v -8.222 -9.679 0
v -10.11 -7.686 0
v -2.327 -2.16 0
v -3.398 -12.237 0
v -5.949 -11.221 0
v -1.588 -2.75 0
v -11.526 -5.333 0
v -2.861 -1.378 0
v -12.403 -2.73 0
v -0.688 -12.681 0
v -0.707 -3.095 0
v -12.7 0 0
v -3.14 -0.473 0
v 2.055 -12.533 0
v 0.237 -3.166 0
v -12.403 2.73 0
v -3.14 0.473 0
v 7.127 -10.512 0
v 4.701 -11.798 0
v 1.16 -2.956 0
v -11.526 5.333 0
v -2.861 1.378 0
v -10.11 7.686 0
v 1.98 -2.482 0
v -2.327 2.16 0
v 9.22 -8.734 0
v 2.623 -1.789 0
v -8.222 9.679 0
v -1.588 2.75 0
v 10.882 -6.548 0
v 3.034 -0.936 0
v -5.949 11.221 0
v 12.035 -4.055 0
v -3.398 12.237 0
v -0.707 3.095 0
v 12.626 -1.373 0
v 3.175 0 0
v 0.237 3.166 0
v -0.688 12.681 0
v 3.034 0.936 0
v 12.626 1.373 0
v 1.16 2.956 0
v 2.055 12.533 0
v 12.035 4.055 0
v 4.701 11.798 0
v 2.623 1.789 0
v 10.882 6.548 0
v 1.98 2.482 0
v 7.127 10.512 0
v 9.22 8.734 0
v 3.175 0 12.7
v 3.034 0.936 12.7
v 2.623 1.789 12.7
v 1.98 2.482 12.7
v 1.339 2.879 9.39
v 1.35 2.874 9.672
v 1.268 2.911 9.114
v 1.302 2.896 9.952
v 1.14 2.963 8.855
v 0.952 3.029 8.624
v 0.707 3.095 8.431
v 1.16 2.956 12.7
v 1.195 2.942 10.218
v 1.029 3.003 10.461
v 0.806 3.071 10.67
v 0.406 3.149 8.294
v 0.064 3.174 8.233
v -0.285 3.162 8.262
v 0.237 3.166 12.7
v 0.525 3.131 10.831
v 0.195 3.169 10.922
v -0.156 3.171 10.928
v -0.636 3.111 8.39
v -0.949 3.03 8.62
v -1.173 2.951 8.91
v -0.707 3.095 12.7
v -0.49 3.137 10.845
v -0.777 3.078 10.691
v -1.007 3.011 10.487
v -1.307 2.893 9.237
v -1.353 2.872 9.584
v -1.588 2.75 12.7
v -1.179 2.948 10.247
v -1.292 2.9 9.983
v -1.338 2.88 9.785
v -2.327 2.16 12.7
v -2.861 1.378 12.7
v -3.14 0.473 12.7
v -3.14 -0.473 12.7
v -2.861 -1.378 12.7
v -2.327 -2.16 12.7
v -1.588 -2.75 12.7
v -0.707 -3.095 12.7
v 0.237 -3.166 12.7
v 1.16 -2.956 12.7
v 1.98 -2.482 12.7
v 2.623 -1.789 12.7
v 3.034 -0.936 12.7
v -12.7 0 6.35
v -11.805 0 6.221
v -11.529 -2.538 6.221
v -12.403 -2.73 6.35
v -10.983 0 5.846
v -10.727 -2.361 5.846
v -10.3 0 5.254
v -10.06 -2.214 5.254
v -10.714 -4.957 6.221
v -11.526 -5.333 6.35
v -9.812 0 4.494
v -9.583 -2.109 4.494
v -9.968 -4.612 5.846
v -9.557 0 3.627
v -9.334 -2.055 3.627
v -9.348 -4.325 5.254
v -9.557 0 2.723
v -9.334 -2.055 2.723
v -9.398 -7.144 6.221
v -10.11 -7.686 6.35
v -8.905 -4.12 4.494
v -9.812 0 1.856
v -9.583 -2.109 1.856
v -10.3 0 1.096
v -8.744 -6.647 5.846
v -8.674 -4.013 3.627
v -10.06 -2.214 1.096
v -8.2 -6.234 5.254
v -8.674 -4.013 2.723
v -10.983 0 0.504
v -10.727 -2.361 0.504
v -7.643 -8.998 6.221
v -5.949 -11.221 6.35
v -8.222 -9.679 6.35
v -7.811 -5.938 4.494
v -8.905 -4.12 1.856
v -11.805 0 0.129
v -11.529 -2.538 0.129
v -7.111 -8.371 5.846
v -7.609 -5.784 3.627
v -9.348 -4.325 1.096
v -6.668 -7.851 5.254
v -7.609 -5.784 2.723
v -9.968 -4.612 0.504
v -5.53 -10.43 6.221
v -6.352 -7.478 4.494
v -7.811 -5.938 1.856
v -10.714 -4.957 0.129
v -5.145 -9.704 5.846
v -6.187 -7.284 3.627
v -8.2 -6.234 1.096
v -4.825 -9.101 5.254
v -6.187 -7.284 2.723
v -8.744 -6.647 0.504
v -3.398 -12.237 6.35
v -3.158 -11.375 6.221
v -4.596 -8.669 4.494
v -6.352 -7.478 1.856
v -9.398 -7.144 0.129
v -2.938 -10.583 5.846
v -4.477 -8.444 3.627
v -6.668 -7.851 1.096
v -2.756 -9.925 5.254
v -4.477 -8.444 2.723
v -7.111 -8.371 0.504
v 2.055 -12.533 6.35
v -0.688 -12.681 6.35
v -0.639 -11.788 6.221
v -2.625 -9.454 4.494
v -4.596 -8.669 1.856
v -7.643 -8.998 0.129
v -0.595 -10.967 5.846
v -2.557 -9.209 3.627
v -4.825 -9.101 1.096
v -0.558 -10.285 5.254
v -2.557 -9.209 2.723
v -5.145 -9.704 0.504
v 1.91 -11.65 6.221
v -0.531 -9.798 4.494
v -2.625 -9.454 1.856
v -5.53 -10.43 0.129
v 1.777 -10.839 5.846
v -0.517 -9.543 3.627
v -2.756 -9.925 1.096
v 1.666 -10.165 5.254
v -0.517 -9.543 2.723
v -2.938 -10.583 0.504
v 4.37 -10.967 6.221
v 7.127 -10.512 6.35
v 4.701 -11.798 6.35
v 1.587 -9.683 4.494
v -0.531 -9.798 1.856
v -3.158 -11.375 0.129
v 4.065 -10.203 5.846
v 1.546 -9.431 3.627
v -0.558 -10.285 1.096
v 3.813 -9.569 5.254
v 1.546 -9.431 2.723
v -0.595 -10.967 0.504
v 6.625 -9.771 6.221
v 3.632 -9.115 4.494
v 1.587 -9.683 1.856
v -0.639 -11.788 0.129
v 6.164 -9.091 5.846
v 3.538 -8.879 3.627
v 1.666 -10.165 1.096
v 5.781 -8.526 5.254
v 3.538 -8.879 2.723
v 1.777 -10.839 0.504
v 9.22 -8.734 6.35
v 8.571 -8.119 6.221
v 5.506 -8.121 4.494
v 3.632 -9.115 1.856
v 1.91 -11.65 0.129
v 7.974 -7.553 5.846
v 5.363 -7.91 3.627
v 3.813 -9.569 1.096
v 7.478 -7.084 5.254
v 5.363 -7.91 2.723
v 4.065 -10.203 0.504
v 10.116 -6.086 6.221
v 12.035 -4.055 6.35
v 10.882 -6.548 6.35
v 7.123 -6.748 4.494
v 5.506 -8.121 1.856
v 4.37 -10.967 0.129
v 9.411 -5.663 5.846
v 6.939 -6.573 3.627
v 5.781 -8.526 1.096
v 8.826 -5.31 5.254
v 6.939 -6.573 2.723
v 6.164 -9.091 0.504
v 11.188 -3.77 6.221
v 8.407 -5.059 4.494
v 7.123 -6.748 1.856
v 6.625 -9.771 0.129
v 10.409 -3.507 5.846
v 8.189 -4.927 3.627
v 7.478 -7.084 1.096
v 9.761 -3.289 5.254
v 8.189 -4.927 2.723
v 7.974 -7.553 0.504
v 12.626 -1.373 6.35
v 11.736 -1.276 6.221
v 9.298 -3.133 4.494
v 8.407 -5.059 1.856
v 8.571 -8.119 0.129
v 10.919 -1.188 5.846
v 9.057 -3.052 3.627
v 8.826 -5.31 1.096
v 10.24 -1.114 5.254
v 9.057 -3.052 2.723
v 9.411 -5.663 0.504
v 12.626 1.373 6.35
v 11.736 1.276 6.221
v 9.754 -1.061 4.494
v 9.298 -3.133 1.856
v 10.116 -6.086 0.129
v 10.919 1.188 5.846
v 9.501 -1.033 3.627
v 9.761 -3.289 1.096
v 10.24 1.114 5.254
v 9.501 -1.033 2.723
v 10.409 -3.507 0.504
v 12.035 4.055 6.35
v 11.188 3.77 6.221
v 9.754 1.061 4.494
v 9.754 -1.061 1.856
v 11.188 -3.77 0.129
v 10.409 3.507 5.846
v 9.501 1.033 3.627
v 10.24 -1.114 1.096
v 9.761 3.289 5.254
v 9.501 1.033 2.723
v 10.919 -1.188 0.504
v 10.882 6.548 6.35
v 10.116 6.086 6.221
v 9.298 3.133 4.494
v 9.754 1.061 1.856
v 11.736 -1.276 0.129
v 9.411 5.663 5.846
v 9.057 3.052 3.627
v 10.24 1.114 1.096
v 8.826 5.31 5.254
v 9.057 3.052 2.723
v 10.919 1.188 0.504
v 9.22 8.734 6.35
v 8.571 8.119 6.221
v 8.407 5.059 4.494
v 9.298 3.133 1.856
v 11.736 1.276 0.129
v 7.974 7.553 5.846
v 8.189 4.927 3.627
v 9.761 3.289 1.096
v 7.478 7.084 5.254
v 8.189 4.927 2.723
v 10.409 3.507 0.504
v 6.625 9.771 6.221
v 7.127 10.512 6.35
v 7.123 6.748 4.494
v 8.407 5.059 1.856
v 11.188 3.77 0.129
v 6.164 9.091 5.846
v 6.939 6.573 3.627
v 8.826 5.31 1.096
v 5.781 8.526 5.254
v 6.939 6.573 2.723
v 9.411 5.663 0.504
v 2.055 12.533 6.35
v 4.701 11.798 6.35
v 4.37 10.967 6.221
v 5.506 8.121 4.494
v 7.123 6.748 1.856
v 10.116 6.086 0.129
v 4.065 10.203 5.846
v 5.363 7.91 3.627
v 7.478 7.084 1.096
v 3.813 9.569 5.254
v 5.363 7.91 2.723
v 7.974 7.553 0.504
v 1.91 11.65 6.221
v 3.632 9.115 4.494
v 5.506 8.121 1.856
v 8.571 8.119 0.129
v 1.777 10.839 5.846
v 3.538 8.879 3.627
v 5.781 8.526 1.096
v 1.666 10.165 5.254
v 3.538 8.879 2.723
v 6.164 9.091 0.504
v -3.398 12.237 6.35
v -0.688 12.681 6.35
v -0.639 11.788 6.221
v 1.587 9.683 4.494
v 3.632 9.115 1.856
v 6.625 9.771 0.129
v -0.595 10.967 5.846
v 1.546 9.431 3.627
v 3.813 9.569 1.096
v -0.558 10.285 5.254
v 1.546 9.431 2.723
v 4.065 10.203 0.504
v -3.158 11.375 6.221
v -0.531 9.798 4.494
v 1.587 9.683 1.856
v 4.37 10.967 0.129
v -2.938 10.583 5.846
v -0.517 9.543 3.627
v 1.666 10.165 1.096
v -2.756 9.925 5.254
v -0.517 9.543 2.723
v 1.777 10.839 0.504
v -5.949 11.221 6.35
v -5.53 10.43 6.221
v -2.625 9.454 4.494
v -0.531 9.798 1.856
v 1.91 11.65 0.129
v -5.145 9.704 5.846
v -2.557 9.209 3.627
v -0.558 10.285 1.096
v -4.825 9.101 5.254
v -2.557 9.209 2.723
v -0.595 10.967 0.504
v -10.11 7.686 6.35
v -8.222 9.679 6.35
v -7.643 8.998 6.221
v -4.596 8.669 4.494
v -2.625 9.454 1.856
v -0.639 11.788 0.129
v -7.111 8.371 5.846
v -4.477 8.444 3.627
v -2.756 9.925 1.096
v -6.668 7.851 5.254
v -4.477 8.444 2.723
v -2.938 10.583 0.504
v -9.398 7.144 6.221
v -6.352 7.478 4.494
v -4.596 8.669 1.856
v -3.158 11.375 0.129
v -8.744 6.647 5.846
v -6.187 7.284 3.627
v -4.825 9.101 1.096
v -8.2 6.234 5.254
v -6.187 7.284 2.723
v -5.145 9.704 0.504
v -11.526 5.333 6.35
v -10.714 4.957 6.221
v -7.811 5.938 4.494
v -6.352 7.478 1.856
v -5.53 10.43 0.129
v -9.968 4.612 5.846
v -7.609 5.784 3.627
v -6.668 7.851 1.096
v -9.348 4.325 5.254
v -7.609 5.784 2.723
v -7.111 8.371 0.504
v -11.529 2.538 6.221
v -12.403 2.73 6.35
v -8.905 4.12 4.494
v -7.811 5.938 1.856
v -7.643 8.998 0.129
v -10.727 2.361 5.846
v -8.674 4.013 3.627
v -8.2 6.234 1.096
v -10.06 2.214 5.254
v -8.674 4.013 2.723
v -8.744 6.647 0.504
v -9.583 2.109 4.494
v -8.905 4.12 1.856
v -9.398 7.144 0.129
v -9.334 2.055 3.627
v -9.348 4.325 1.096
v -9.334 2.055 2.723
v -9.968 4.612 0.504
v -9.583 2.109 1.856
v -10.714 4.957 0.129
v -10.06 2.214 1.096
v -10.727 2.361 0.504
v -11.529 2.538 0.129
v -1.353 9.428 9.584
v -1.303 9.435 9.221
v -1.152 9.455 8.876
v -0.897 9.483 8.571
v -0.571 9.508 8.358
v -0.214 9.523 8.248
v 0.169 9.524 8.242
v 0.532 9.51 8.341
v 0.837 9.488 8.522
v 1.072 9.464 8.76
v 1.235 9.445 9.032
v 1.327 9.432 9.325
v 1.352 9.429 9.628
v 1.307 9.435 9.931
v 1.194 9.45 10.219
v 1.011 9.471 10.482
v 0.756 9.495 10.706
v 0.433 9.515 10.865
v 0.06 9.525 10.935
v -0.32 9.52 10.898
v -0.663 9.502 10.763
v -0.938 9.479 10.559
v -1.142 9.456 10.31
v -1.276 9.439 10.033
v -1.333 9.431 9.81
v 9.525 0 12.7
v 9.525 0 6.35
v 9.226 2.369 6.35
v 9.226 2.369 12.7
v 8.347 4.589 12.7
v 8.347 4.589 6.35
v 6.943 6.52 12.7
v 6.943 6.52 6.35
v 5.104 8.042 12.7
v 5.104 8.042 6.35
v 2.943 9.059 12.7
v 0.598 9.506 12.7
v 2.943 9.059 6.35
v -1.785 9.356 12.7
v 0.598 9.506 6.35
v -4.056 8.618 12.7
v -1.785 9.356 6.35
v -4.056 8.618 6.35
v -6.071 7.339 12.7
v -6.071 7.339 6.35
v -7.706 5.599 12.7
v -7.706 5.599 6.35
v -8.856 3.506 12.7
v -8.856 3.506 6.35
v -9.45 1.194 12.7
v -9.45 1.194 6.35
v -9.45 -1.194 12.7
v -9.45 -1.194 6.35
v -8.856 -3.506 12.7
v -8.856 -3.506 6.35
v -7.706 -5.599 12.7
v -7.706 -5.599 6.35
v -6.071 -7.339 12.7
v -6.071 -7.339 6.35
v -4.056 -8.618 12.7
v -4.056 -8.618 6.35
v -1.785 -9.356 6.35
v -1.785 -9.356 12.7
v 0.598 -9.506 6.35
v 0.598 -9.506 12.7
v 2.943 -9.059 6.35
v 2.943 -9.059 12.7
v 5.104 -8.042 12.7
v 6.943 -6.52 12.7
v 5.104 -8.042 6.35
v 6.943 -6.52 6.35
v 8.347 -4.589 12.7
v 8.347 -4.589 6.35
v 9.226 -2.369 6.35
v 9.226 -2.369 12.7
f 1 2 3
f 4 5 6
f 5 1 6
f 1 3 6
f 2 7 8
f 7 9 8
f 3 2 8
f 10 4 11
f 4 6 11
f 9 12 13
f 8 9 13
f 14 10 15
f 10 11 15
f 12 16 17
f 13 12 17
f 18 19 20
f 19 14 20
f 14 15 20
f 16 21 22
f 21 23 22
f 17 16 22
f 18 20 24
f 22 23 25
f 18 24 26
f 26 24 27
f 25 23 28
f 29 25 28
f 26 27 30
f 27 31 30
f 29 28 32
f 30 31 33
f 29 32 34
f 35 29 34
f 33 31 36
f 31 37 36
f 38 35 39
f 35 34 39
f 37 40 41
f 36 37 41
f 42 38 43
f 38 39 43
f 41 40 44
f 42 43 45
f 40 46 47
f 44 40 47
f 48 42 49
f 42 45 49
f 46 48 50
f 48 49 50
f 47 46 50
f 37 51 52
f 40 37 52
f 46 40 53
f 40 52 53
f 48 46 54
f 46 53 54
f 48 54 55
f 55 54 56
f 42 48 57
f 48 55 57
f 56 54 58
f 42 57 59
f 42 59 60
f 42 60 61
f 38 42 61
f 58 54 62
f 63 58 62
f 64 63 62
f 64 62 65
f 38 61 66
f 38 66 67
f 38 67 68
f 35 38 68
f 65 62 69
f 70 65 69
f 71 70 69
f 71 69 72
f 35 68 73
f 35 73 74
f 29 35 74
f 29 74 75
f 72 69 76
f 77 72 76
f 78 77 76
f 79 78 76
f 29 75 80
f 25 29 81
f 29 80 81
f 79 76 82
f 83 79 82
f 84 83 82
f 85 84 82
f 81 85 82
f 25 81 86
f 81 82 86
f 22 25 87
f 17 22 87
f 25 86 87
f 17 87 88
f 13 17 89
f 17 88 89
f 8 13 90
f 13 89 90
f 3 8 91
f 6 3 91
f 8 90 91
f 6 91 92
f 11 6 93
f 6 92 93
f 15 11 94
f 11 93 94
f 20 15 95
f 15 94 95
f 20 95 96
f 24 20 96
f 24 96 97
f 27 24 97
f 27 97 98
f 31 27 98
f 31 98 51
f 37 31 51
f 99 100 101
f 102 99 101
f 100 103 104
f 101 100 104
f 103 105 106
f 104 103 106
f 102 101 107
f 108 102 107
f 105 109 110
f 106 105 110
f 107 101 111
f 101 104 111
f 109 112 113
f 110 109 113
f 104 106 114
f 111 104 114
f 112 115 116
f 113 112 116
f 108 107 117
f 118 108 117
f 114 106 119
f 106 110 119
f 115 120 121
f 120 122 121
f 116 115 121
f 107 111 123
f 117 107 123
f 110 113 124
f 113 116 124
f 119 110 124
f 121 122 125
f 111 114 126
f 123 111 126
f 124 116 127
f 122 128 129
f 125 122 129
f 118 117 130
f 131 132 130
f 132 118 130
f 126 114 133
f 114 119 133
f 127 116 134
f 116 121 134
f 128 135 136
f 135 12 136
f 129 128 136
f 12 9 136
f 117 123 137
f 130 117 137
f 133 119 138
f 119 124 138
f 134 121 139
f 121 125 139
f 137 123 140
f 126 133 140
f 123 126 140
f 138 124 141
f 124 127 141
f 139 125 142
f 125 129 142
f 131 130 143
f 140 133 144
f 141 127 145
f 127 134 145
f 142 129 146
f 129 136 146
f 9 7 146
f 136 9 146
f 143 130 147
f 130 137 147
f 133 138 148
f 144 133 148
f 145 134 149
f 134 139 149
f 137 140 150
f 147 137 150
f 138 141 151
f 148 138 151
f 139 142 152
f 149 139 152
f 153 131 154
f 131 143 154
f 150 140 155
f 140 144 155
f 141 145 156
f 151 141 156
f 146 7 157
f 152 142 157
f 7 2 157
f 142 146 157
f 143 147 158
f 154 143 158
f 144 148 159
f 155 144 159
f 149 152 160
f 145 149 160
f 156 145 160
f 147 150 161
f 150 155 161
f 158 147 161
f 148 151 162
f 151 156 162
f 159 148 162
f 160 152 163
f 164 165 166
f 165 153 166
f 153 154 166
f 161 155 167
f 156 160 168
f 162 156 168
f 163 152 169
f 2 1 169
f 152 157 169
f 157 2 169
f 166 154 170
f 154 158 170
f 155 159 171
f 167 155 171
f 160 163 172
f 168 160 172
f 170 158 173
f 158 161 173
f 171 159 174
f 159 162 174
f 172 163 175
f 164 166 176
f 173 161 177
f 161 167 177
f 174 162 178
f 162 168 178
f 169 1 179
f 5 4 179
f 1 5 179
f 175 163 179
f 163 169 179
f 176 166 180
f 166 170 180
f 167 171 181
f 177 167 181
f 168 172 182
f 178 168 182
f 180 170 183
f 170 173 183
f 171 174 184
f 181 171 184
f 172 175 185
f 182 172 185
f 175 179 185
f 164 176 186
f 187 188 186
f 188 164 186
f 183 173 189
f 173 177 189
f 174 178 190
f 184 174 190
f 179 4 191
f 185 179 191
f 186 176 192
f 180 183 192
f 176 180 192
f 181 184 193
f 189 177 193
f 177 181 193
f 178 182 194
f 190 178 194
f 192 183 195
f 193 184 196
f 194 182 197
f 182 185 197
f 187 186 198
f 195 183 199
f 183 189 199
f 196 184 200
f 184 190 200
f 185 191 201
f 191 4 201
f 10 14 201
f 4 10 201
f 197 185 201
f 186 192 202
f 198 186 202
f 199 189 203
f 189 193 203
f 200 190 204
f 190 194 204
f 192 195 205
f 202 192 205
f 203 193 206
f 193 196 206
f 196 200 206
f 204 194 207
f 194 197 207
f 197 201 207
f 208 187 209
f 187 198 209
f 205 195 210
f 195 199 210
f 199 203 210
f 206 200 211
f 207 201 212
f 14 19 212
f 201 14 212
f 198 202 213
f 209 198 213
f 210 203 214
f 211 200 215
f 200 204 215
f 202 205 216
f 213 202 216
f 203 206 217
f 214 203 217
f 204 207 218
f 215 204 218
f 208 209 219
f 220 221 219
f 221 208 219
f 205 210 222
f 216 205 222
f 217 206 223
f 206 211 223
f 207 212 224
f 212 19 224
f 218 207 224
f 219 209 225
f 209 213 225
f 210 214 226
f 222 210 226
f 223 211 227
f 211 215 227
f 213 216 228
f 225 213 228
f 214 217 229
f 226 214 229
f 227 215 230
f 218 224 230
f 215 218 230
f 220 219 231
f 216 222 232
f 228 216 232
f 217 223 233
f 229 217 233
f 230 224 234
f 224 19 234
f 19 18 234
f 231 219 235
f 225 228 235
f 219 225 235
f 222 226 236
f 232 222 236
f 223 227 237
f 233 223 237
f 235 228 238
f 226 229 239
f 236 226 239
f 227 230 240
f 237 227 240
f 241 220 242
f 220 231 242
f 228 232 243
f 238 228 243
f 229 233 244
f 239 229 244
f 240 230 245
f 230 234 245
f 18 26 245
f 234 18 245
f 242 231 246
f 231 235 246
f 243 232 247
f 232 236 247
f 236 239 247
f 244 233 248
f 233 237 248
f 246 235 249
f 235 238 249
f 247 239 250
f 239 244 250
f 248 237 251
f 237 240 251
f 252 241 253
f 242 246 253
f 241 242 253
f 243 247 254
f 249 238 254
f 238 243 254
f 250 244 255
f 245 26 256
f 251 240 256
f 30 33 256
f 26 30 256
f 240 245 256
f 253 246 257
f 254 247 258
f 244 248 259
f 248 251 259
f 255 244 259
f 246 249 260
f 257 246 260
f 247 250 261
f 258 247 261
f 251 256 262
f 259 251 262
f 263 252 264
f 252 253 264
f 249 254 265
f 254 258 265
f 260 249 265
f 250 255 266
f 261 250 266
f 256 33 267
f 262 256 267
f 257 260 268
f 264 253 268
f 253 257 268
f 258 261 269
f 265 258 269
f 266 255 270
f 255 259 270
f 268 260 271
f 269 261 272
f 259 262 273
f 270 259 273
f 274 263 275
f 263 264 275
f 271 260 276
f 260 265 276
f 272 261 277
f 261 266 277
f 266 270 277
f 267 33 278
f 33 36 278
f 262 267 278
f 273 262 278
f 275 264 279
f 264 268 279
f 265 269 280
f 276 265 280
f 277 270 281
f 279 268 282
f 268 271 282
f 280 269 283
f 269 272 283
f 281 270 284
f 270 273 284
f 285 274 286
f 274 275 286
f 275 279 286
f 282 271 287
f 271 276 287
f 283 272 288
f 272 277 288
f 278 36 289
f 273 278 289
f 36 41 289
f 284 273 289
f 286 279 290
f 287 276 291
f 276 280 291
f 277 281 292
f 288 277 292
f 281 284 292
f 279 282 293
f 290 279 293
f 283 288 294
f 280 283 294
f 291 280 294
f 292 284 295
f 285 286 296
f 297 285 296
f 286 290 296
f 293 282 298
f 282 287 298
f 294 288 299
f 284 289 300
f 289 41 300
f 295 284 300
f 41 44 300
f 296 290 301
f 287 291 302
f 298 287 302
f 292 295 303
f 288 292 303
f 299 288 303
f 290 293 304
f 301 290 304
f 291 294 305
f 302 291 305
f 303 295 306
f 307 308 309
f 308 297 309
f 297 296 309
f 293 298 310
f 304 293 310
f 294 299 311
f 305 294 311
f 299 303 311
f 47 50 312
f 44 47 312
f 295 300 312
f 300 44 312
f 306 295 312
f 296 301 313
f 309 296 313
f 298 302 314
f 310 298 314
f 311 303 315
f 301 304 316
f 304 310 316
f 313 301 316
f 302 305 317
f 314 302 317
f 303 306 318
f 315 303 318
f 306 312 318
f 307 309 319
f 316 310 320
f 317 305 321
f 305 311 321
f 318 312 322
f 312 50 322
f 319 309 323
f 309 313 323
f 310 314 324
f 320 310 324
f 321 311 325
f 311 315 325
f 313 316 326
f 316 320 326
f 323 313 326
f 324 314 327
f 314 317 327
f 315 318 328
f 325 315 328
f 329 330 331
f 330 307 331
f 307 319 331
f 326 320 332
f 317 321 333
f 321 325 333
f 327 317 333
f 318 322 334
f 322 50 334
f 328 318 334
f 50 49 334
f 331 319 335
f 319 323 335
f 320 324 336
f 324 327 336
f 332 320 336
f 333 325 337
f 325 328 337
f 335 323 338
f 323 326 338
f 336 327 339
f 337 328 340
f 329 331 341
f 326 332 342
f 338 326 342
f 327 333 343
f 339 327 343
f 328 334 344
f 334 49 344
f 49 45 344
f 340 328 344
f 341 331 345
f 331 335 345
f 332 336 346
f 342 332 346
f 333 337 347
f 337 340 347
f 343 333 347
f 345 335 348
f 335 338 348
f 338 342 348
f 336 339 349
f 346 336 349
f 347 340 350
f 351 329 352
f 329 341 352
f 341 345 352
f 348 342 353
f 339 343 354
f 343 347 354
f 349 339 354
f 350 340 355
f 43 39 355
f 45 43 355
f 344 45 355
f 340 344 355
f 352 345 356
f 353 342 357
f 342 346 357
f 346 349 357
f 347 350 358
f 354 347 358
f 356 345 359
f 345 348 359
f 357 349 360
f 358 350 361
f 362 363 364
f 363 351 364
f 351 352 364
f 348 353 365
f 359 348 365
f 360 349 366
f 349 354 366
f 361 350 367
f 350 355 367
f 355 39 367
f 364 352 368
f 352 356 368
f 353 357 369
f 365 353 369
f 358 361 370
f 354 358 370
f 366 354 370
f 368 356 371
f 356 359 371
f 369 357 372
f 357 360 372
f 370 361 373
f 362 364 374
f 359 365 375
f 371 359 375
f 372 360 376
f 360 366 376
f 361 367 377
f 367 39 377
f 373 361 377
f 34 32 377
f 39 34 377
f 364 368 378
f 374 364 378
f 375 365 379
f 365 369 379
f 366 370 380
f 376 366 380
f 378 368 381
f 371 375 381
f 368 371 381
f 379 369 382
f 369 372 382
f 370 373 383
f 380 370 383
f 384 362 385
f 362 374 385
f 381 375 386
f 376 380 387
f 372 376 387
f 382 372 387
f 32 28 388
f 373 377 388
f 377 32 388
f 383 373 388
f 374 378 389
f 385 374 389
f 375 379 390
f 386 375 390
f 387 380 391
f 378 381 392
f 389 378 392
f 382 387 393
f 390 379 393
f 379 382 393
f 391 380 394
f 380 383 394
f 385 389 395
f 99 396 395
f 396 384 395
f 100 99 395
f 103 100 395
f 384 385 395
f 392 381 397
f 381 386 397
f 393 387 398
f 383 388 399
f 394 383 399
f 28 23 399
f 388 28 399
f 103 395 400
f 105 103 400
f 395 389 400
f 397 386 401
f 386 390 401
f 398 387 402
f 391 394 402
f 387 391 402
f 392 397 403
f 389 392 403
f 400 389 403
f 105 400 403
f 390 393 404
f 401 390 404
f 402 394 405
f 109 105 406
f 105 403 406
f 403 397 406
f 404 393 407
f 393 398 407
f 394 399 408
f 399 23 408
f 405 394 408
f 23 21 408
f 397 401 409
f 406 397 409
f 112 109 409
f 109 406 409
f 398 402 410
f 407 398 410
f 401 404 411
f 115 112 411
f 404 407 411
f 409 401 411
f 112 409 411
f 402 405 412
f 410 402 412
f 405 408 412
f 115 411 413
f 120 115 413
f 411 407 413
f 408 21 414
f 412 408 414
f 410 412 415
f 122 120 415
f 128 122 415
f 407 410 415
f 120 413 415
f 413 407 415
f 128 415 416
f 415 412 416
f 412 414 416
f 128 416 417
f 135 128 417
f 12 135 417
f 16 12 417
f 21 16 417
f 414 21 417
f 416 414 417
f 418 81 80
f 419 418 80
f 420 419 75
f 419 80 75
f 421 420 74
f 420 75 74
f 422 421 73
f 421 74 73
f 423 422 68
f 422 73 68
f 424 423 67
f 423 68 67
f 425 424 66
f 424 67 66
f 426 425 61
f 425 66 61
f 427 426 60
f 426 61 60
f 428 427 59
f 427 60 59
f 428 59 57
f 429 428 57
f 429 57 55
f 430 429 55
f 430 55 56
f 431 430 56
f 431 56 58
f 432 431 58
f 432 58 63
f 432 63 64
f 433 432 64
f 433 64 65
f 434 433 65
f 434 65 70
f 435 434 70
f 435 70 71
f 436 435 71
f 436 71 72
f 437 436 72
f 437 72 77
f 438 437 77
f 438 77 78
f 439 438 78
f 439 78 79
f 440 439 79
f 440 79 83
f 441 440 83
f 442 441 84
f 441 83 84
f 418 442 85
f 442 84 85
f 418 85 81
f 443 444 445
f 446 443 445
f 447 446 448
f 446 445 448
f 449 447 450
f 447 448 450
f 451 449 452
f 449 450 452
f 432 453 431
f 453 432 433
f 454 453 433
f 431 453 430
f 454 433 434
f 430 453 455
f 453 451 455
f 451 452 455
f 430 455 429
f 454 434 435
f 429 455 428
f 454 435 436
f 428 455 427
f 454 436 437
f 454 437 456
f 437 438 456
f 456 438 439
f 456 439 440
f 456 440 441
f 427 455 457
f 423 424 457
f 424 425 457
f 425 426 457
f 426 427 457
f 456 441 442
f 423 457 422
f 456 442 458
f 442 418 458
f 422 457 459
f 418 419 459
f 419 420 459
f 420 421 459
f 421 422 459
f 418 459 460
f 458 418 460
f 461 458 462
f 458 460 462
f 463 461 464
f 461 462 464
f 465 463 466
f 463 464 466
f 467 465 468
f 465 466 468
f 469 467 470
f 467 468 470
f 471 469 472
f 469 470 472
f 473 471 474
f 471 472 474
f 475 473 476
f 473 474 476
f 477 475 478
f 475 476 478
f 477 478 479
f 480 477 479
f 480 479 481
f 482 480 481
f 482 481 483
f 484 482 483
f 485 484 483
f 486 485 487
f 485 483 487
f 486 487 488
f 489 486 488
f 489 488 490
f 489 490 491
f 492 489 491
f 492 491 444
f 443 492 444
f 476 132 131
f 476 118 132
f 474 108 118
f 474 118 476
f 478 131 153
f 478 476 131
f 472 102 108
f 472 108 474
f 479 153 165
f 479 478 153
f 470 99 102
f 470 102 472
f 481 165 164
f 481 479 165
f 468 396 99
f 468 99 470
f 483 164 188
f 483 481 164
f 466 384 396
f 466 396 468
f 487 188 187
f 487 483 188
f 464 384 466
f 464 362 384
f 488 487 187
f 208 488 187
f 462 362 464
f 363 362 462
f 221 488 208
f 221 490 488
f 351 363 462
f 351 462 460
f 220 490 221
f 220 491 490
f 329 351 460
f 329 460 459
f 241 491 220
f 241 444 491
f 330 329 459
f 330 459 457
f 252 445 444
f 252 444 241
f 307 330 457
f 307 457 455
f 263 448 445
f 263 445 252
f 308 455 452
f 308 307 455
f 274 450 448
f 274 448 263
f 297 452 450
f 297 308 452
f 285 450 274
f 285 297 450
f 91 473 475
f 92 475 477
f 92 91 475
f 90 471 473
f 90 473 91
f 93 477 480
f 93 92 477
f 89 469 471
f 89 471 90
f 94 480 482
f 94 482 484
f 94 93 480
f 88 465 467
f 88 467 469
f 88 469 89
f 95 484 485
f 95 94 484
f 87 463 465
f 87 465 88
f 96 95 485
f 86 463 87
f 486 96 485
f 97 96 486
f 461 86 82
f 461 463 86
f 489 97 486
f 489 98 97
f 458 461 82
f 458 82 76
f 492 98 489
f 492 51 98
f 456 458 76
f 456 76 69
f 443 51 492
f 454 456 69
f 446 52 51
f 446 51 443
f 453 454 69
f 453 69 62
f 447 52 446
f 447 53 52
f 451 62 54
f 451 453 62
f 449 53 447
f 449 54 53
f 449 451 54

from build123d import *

# Parameters (mm, degrees)
SKETCH1_R                 = 12.7
BOSS_EXTRUDE1_DEPTH       = 6.35
SKETCH2_R                 = 9.525
BOSS_EXTRUDE2_DEPTH       = 6.35
SKETCH3_R                 = 3.175
CUT_EXTRUDE1_DEPTH        = 12.7
F_6_32_TAPPED_HOLE1_D     = 2.7051
F_6_32_TAPPED_HOLE1_DEPTH = 9.524
F_6_32_TAPPED_HOLE1_TIP   = 0.81269403


with BuildPart() as part:
    # Sketch1 → Boss-Extrude1 (new body)
    with BuildSketch(Plane.XY):
        Circle(SKETCH1_R)
    extrude(amount=BOSS_EXTRUDE1_DEPTH)

    # Sketch2 → Boss-Extrude2 (add)
    with BuildSketch(Plane.XY.offset(6.35)):
        Circle(SKETCH2_R)
    extrude(amount=BOSS_EXTRUDE2_DEPTH)

    # Sketch3 → Cut-Extrude1 (cut)
    with BuildSketch(Plane.XY.offset(12.7)):
        Circle(SKETCH3_R)
    extrude(amount=-CUT_EXTRUDE1_DEPTH, mode=Mode.SUBTRACT)

    # Sketch4 → Cut-Revolve1 (revolve, cut)
    with BuildSketch(Plane(origin=(0, 0, 0), x_dir=(1, 0, 0), z_dir=(0, 1, 0)), mode=Mode.PRIVATE) as cut_revolve1_sk:
        with BuildLine():
            Line((12.7, 0), (12.7, -6.35))
            ThreePointArc((12.7, -6.35), (9.525, -3.175), (12.7, 0))
        make_face()
    revolve(cut_revolve1_sk.sketch.rotate(Axis((0, 0, -3.575887172), (0, 0, 1)), 180), axis=Axis((0, 0, -3.575887172), (0, 0, 1)), mode=Mode.SUBTRACT)

    # #6-32 Tapped Hole1
    with Locations(Plane(origin=(-9.4e-08, 9.525, 9.584004604), x_dir=(1.0, 9.833e-09, 0), z_dir=(-9.833e-09, 1.0, 0))):
        with Locations((0, 0)):
            Hole(F_6_32_TAPPED_HOLE1_D / 2, depth=F_6_32_TAPPED_HOLE1_DEPTH)
            with Locations((0, 0, -(F_6_32_TAPPED_HOLE1_DEPTH + F_6_32_TAPPED_HOLE1_TIP / 2))):  # 118° drill point
                Cone(0, F_6_32_TAPPED_HOLE1_D / 2, F_6_32_TAPPED_HOLE1_TIP, mode=Mode.SUBTRACT)


solid = part.part
